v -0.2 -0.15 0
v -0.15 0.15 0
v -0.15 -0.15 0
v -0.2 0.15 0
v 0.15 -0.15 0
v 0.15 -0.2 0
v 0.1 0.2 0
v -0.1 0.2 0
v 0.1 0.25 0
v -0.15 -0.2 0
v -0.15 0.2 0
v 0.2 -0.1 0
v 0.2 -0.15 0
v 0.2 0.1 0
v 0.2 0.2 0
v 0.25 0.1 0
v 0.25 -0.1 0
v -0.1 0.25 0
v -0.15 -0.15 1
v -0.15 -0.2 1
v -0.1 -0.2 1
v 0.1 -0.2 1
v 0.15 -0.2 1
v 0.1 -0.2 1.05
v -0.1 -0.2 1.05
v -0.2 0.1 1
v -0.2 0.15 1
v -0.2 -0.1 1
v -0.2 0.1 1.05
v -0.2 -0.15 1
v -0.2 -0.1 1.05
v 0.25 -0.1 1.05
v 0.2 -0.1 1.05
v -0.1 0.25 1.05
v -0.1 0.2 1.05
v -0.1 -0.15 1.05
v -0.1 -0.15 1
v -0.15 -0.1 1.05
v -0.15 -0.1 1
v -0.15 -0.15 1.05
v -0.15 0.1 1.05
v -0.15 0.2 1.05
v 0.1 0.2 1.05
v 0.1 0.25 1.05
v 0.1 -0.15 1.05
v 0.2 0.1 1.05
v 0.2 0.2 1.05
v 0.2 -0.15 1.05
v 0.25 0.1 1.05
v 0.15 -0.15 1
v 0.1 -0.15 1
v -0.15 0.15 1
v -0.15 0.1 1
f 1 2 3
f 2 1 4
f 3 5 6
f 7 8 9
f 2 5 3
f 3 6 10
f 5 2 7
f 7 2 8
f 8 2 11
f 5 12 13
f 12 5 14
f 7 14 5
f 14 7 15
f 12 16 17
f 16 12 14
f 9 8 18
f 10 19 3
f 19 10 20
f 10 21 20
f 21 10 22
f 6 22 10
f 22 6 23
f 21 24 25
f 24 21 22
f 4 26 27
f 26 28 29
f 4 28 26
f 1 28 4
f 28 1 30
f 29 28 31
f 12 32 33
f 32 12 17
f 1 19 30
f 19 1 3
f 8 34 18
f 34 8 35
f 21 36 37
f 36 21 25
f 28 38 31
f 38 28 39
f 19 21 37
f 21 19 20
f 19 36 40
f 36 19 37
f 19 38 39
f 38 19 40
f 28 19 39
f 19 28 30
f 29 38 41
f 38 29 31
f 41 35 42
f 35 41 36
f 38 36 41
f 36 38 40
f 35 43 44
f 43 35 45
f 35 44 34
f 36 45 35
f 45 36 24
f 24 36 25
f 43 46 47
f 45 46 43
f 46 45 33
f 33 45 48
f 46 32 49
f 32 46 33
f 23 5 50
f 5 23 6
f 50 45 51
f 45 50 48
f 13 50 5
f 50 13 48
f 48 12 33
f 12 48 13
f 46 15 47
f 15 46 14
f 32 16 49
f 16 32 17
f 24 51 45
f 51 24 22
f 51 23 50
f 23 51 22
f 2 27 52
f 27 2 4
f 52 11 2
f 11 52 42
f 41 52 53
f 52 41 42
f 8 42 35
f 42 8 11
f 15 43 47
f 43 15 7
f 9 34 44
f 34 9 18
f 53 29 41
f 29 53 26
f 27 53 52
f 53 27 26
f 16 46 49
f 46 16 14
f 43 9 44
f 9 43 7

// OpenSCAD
translate([-0.125,-0.175,0.025]) cube(0.05, center = true);
translate([-0.175,-0.125,0.025]) cube(0.05, center = true);
translate([-0.125,-0.125,0.025]) cube(0.05, center = true);
translate([-0.125,-0.175,0.075]) cube(0.05, center = true);
translate([-0.175,-0.125,0.075]) cube(0.05, center = true);
translate([-0.125,-0.125,0.075]) cube(0.05, center = true);
translate([-0.05,-0.15,0.05]) cube(0.1, center = true);
translate([-0.15,-0.05,0.05]) cube(0.1, center = true);
translate([-0.05,-0.05,0.05]) cube(0.1, center = true);
translate([-0.125,-0.175,0.125]) cube(0.05, center = true);
translate([-0.175,-0.125,0.125]) cube(0.05, center = true);
translate([-0.125,-0.125,0.125]) cube(0.05, center = true);
translate([-0.125,-0.175,0.175]) cube(0.05, center = true);
translate([-0.175,-0.125,0.175]) cube(0.05, center = true);
translate([-0.125,-0.125,0.175]) cube(0.05, center = true);
translate([-0.05,-0.15,0.15]) cube(0.1, center = true);
translate([-0.15,-0.05,0.15]) cube(0.1, center = true);
translate([-0.05,-0.05,0.15]) cube(0.1, center = true);
translate([-0.125,-0.175,0.225]) cube(0.05, center = true);
translate([-0.175,-0.125,0.225]) cube(0.05, center = true);
translate([-0.125,-0.125,0.225]) cube(0.05, center = true);
translate([-0.125,-0.175,0.275]) cube(0.05, center = true);
translate([-0.175,-0.125,0.275]) cube(0.05, center = true);
translate([-0.125,-0.125,0.275]) cube(0.05, center = true);
translate([-0.05,-0.15,0.25]) cube(0.1, center = true);
translate([-0.15,-0.05,0.25]) cube(0.1, center = true);
translate([-0.05,-0.05,0.25]) cube(0.1, center = true);
translate([-0.125,-0.175,0.325]) cube(0.05, center = true);
translate([-0.175,-0.125,0.325]) cube(0.05, center = true);
translate([-0.125,-0.125,0.325]) cube(0.05, center = true);
translate([-0.125,-0.175,0.375]) cube(0.05, center = true);
translate([-0.175,-0.125,0.375]) cube(0.05, center = true);
translate([-0.125,-0.125,0.375]) cube(0.05, center = true);
translate([-0.05,-0.15,0.35]) cube(0.1, center = true);
translate([-0.15,-0.05,0.35]) cube(0.1, center = true);
translate([-0.05,-0.05,0.35]) cube(0.1, center = true);
translate([-0.125,-0.175,0.425]) cube(0.05, center = true);
translate([-0.175,-0.125,0.425]) cube(0.05, center = true);
translate([-0.125,-0.125,0.425]) cube(0.05, center = true);
translate([-0.125,-0.175,0.475]) cube(0.05, center = true);
translate([-0.175,-0.125,0.475]) cube(0.05, center = true);
translate([-0.125,-0.125,0.475]) cube(0.05, center = true);
translate([-0.05,-0.15,0.45]) cube(0.1, center = true);
translate([-0.15,-0.05,0.45]) cube(0.1, center = true);
translate([-0.05,-0.05,0.45]) cube(0.1, center = true);
translate([-0.125,-0.175,0.525]) cube(0.05, center = true);
translate([-0.175,-0.125,0.525]) cube(0.05, center = true);
translate([-0.125,-0.125,0.525]) cube(0.05, center = true);
translate([-0.125,-0.175,0.575]) cube(0.05, center = true);
translate([-0.175,-0.125,0.575]) cube(0.05, center = true);
translate([-0.125,-0.125,0.575]) cube(0.05, center = true);
translate([-0.05,-0.15,0.55]) cube(0.1, center = true);
translate([-0.15,-0.05,0.55]) cube(0.1, center = true);
translate([-0.05,-0.05,0.55]) cube(0.1, center = true);
translate([-0.125,-0.175,0.625]) cube(0.05, center = true);
translate([-0.175,-0.125,0.625]) cube(0.05, center = true);
translate([-0.125,-0.125,0.625]) cube(0.05, center = true);
translate([-0.125,-0.175,0.675]) cube(0.05, center = true);
translate([-0.175,-0.125,0.675]) cube(0.05, center = true);
translate([-0.125,-0.125,0.675]) cube(0.05, center = true);
translate([-0.05,-0.15,0.65]) cube(0.1, center = true);
translate([-0.15,-0.05,0.65]) cube(0.1, center = true);
translate([-0.05,-0.05,0.65]) cube(0.1, center = true);
translate([-0.125,-0.175,0.725]) cube(0.05, center = true);
translate([-0.175,-0.125,0.725]) cube(0.05, center = true);
translate([-0.125,-0.125,0.725]) cube(0.05, center = true);
translate([-0.125,-0.175,0.775]) cube(0.05, center = true);
translate([-0.175,-0.125,0.775]) cube(0.05, center = true);
translate([-0.125,-0.125,0.775]) cube(0.05, center = true);
translate([-0.05,-0.15,0.75]) cube(0.1, center = true);
translate([-0.15,-0.05,0.75]) cube(0.1, center = true);
translate([-0.05,-0.05,0.75]) cube(0.1, center = true);
translate([-0.125,-0.175,0.825]) cube(0.05, center = true);
translate([-0.175,-0.125,0.825]) cube(0.05, center = true);
translate([-0.125,-0.125,0.825]) cube(0.05, center = true);
translate([-0.125,-0.175,0.875]) cube(0.05, center = true);
translate([-0.175,-0.125,0.875]) cube(0.05, center = true);
translate([-0.125,-0.125,0.875]) cube(0.05, center = true);
translate([-0.05,-0.15,0.85]) cube(0.1, center = true);
translate([-0.15,-0.05,0.85]) cube(0.1, center = true);
translate([-0.05,-0.05,0.85]) cube(0.1, center = true);
translate([-0.125,-0.175,0.925]) cube(0.05, center = true);
translate([-0.175,-0.125,0.925]) cube(0.05, center = true);
translate([-0.125,-0.125,0.925]) cube(0.05, center = true);
translate([-0.125,-0.175,0.975]) cube(0.05, center = true);
translate([-0.175,-0.125,0.975]) cube(0.05, center = true);
translate([-0.125,-0.125,0.975]) cube(0.05, center = true);
translate([-0.05,-0.15,0.95]) cube(0.1, center = true);
translate([-0.15,-0.05,0.95]) cube(0.1, center = true);
translate([-0.05,-0.05,0.95]) cube(0.1, center = true);
translate([-0.125,-0.125,1.025]) cube(0.05, center = true);
translate([-0.075,-0.175,1.025]) cube(0.05, center = true);
translate([-0.025,-0.175,1.025]) cube(0.05, center = true);
translate([-0.075,-0.125,1.025]) cube(0.05, center = true);
translate([-0.025,-0.125,1.025]) cube(0.05, center = true);
translate([-0.175,-0.075,1.025]) cube(0.05, center = true);
translate([-0.125,-0.075,1.025]) cube(0.05, center = true);
translate([-0.175,-0.025,1.025]) cube(0.05, center = true);
translate([-0.125,-0.025,1.025]) cube(0.05, center = true);
translate([-0.075,-0.075,1.025]) cube(0.05, center = true);
translate([-0.025,-0.075,1.025]) cube(0.05, center = true);
translate([-0.075,-0.025,1.025]) cube(0.05, center = true);
translate([-0.025,-0.025,1.025]) cube(0.05, center = true);
translate([0.05,-0.15,0.05]) cube(0.1, center = true);
translate([0.125,-0.175,0.025]) cube(0.05, center = true);
translate([0.125,-0.125,0.025]) cube(0.05, center = true);
translate([0.175,-0.125,0.025]) cube(0.05, center = true);
translate([0.125,-0.175,0.075]) cube(0.05, center = true);
translate([0.125,-0.125,0.075]) cube(0.05, center = true);
translate([0.175,-0.125,0.075]) cube(0.05, center = true);
translate([0.05,-0.05,0.05]) cube(0.1, center = true);
translate([0.15,-0.05,0.05]) cube(0.1, center = true);
translate([0.05,-0.15,0.15]) cube(0.1, center = true);
translate([0.125,-0.175,0.125]) cube(0.05, center = true);
translate([0.125,-0.125,0.125]) cube(0.05, center = true);
translate([0.175,-0.125,0.125]) cube(0.05, center = true);
translate([0.125,-0.175,0.175]) cube(0.05, center = true);
translate([0.125,-0.125,0.175]) cube(0.05, center = true);
translate([0.175,-0.125,0.175]) cube(0.05, center = true);
translate([0.05,-0.05,0.15]) cube(0.1, center = true);
translate([0.15,-0.05,0.15]) cube(0.1, center = true);
translate([0.225,-0.075,0.025]) cube(0.05, center = true);
translate([0.225,-0.025,0.025]) cube(0.05, center = true);
translate([0.225,-0.075,0.075]) cube(0.05, center = true);
translate([0.225,-0.025,0.075]) cube(0.05, center = true);
translate([0.225,-0.075,0.125]) cube(0.05, center = true);
translate([0.225,-0.025,0.125]) cube(0.05, center = true);
translate([0.225,-0.075,0.175]) cube(0.05, center = true);
translate([0.225,-0.025,0.175]) cube(0.05, center = true);
translate([0.05,-0.15,0.25]) cube(0.1, center = true);
translate([0.125,-0.175,0.225]) cube(0.05, center = true);
translate([0.125,-0.125,0.225]) cube(0.05, center = true);
translate([0.175,-0.125,0.225]) cube(0.05, center = true);
translate([0.125,-0.175,0.275]) cube(0.05, center = true);
translate([0.125,-0.125,0.275]) cube(0.05, center = true);
translate([0.175,-0.125,0.275]) cube(0.05, center = true);
translate([0.05,-0.05,0.25]) cube(0.1, center = true);
translate([0.15,-0.05,0.25]) cube(0.1, center = true);
translate([0.05,-0.15,0.35]) cube(0.1, center = true);
translate([0.125,-0.175,0.325]) cube(0.05, center = true);
translate([0.125,-0.125,0.325]) cube(0.05, center = true);
translate([0.175,-0.125,0.325]) cube(0.05, center = true);
translate([0.125,-0.175,0.375]) cube(0.05, center = true);
translate([0.125,-0.125,0.375]) cube(0.05, center = true);
translate([0.175,-0.125,0.375]) cube(0.05, center = true);
translate([0.05,-0.05,0.35]) cube(0.1, center = true);
translate([0.15,-0.05,0.35]) cube(0.1, center = true);
translate([0.225,-0.075,0.225]) cube(0.05, center = true);
translate([0.225,-0.025,0.225]) cube(0.05, center = true);
translate([0.225,-0.075,0.275]) cube(0.05, center = true);
translate([0.225,-0.025,0.275]) cube(0.05, center = true);
translate([0.225,-0.075,0.325]) cube(0.05, center = true);
translate([0.225,-0.025,0.325]) cube(0.05, center = true);
translate([0.225,-0.075,0.375]) cube(0.05, center = true);
translate([0.225,-0.025,0.375]) cube(0.05, center = true);
translate([0.05,-0.15,0.45]) cube(0.1, center = true);
translate([0.125,-0.175,0.425]) cube(0.05, center = true);
translate([0.125,-0.125,0.425]) cube(0.05, center = true);
translate([0.175,-0.125,0.425]) cube(0.05, center = true);
translate([0.125,-0.175,0.475]) cube(0.05, center = true);
translate([0.125,-0.125,0.475]) cube(0.05, center = true);
translate([0.175,-0.125,0.475]) cube(0.05, center = true);
translate([0.05,-0.05,0.45]) cube(0.1, center = true);
translate([0.15,-0.05,0.45]) cube(0.1, center = true);
translate([0.05,-0.15,0.55]) cube(0.1, center = true);
translate([0.125,-0.175,0.525]) cube(0.05, center = true);
translate([0.125,-0.125,0.525]) cube(0.05, center = true);
translate([0.175,-0.125,0.525]) cube(0.05, center = true);
translate([0.125,-0.175,0.575]) cube(0.05, center = true);
translate([0.125,-0.125,0.575]) cube(0.05, center = true);
translate([0.175,-0.125,0.575]) cube(0.05, center = true);
translate([0.05,-0.05,0.55]) cube(0.1, center = true);
translate([0.15,-0.05,0.55]) cube(0.1, center = true);
translate([0.225,-0.075,0.425]) cube(0.05, center = true);
translate([0.225,-0.025,0.425]) cube(0.05, center = true);
translate([0.225,-0.075,0.475]) cube(0.05, center = true);
translate([0.225,-0.025,0.475]) cube(0.05, center = true);
translate([0.225,-0.075,0.525]) cube(0.05, center = true);
translate([0.225,-0.025,0.525]) cube(0.05, center = true);
translate([0.225,-0.075,0.575]) cube(0.05, center = true);
translate([0.225,-0.025,0.575]) cube(0.05, center = true);
translate([0.05,-0.15,0.65]) cube(0.1, center = true);
translate([0.125,-0.175,0.625]) cube(0.05, center = true);
translate([0.125,-0.125,0.625]) cube(0.05, center = true);
translate([0.175,-0.125,0.625]) cube(0.05, center = true);
translate([0.125,-0.175,0.675]) cube(0.05, center = true);
translate([0.125,-0.125,0.675]) cube(0.05, center = true);
translate([0.175,-0.125,0.675]) cube(0.05, center = true);
translate([0.05,-0.05,0.65]) cube(0.1, center = true);
translate([0.15,-0.05,0.65]) cube(0.1, center = true);
translate([0.05,-0.15,0.75]) cube(0.1, center = true);
translate([0.125,-0.175,0.725]) cube(0.05, center = true);
translate([0.125,-0.125,0.725]) cube(0.05, center = true);
translate([0.175,-0.125,0.725]) cube(0.05, center = true);
translate([0.125,-0.175,0.775]) cube(0.05, center = true);
translate([0.125,-0.125,0.775]) cube(0.05, center = true);
translate([0.175,-0.125,0.775]) cube(0.05, center = true);
translate([0.05,-0.05,0.75]) cube(0.1, center = true);
translate([0.15,-0.05,0.75]) cube(0.1, center = true);
translate([0.225,-0.075,0.625]) cube(0.05, center = true);
translate([0.225,-0.025,0.625]) cube(0.05, center = true);
translate([0.225,-0.075,0.675]) cube(0.05, center = true);
translate([0.225,-0.025,0.675]) cube(0.05, center = true);
translate([0.225,-0.075,0.725]) cube(0.05, center = true);
translate([0.225,-0.025,0.725]) cube(0.05, center = true);
translate([0.225,-0.075,0.775]) cube(0.05, center = true);
translate([0.225,-0.025,0.775]) cube(0.05, center = true);
translate([0.05,-0.15,0.85]) cube(0.1, center = true);
translate([0.125,-0.175,0.825]) cube(0.05, center = true);
translate([0.125,-0.125,0.825]) cube(0.05, center = true);
translate([0.175,-0.125,0.825]) cube(0.05, center = true);
translate([0.125,-0.175,0.875]) cube(0.05, center = true);
translate([0.125,-0.125,0.875]) cube(0.05, center = true);
translate([0.175,-0.125,0.875]) cube(0.05, center = true);
translate([0.05,-0.05,0.85]) cube(0.1, center = true);
translate([0.15,-0.05,0.85]) cube(0.1, center = true);
translate([0.05,-0.15,0.95]) cube(0.1, center = true);
translate([0.125,-0.175,0.925]) cube(0.05, center = true);
translate([0.125,-0.125,0.925]) cube(0.05, center = true);
translate([0.175,-0.125,0.925]) cube(0.05, center = true);
translate([0.125,-0.175,0.975]) cube(0.05, center = true);
translate([0.125,-0.125,0.975]) cube(0.05, center = true);
translate([0.175,-0.125,0.975]) cube(0.05, center = true);
translate([0.05,-0.05,0.95]) cube(0.1, center = true);
translate([0.15,-0.05,0.95]) cube(0.1, center = true);
translate([0.225,-0.075,0.825]) cube(0.05, center = true);
translate([0.225,-0.025,0.825]) cube(0.05, center = true);
translate([0.225,-0.075,0.875]) cube(0.05, center = true);
translate([0.225,-0.025,0.875]) cube(0.05, center = true);
translate([0.225,-0.075,0.925]) cube(0.05, center = true);
translate([0.225,-0.025,0.925]) cube(0.05, center = true);
translate([0.225,-0.075,0.975]) cube(0.05, center = true);
translate([0.225,-0.025,0.975]) cube(0.05, center = true);
translate([0.025,-0.175,1.025]) cube(0.05, center = true);
translate([0.075,-0.175,1.025]) cube(0.05, center = true);
translate([0.025,-0.125,1.025]) cube(0.05, center = true);
translate([0.075,-0.125,1.025]) cube(0.05, center = true);
translate([0.125,-0.125,1.025]) cube(0.05, center = true);
translate([0.175,-0.125,1.025]) cube(0.05, center = true);
translate([0.025,-0.075,1.025]) cube(0.05, center = true);
translate([0.075,-0.075,1.025]) cube(0.05, center = true);
translate([0.025,-0.025,1.025]) cube(0.05, center = true);
translate([0.075,-0.025,1.025]) cube(0.05, center = true);
translate([0.125,-0.075,1.025]) cube(0.05, center = true);
translate([0.175,-0.075,1.025]) cube(0.05, center = true);
translate([0.125,-0.025,1.025]) cube(0.05, center = true);
translate([0.175,-0.025,1.025]) cube(0.05, center = true);
translate([0.225,-0.075,1.025]) cube(0.05, center = true);
translate([0.225,-0.025,1.025]) cube(0.05, center = true);
translate([-0.15,0.05,0.05]) cube(0.1, center = true);
translate([-0.05,0.05,0.05]) cube(0.1, center = true);
translate([-0.175,0.125,0.025]) cube(0.05, center = true);
translate([-0.125,0.125,0.025]) cube(0.05, center = true);
translate([-0.125,0.175,0.025]) cube(0.05, center = true);
translate([-0.175,0.125,0.075]) cube(0.05, center = true);
translate([-0.125,0.125,0.075]) cube(0.05, center = true);
translate([-0.125,0.175,0.075]) cube(0.05, center = true);
translate([-0.05,0.15,0.05]) cube(0.1, center = true);
translate([-0.15,0.05,0.15]) cube(0.1, center = true);
translate([-0.05,0.05,0.15]) cube(0.1, center = true);
translate([-0.175,0.125,0.125]) cube(0.05, center = true);
translate([-0.125,0.125,0.125]) cube(0.05, center = true);
translate([-0.125,0.175,0.125]) cube(0.05, center = true);
translate([-0.175,0.125,0.175]) cube(0.05, center = true);
translate([-0.125,0.125,0.175]) cube(0.05, center = true);
translate([-0.125,0.175,0.175]) cube(0.05, center = true);
translate([-0.05,0.15,0.15]) cube(0.1, center = true);
translate([-0.075,0.225,0.025]) cube(0.05, center = true);
translate([-0.025,0.225,0.025]) cube(0.05, center = true);
translate([-0.075,0.225,0.075]) cube(0.05, center = true);
translate([-0.025,0.225,0.075]) cube(0.05, center = true);
translate([-0.075,0.225,0.125]) cube(0.05, center = true);
translate([-0.025,0.225,0.125]) cube(0.05, center = true);
translate([-0.075,0.225,0.175]) cube(0.05, center = true);
translate([-0.025,0.225,0.175]) cube(0.05, center = true);
translate([-0.15,0.05,0.25]) cube(0.1, center = true);
translate([-0.05,0.05,0.25]) cube(0.1, center = true);
translate([-0.175,0.125,0.225]) cube(0.05, center = true);
translate([-0.125,0.125,0.225]) cube(0.05, center = true);
translate([-0.125,0.175,0.225]) cube(0.05, center = true);
translate([-0.175,0.125,0.275]) cube(0.05, center = true);
translate([-0.125,0.125,0.275]) cube(0.05, center = true);
translate([-0.125,0.175,0.275]) cube(0.05, center = true);
translate([-0.05,0.15,0.25]) cube(0.1, center = true);
translate([-0.15,0.05,0.35]) cube(0.1, center = true);
translate([-0.05,0.05,0.35]) cube(0.1, center = true);
translate([-0.175,0.125,0.325]) cube(0.05, center = true);
translate([-0.125,0.125,0.325]) cube(0.05, center = true);
translate([-0.125,0.175,0.325]) cube(0.05, center = true);
translate([-0.175,0.125,0.375]) cube(0.05, center = true);
translate([-0.125,0.125,0.375]) cube(0.05, center = true);
translate([-0.125,0.175,0.375]) cube(0.05, center = true);
translate([-0.05,0.15,0.35]) cube(0.1, center = true);
translate([-0.075,0.225,0.225]) cube(0.05, center = true);
translate([-0.025,0.225,0.225]) cube(0.05, center = true);
translate([-0.075,0.225,0.275]) cube(0.05, center = true);
translate([-0.025,0.225,0.275]) cube(0.05, center = true);
translate([-0.075,0.225,0.325]) cube(0.05, center = true);
translate([-0.025,0.225,0.325]) cube(0.05, center = true);
translate([-0.075,0.225,0.375]) cube(0.05, center = true);
translate([-0.025,0.225,0.375]) cube(0.05, center = true);
translate([-0.15,0.05,0.45]) cube(0.1, center = true);
translate([-0.05,0.05,0.45]) cube(0.1, center = true);
translate([-0.175,0.125,0.425]) cube(0.05, center = true);
translate([-0.125,0.125,0.425]) cube(0.05, center = true);
translate([-0.125,0.175,0.425]) cube(0.05, center = true);
translate([-0.175,0.125,0.475]) cube(0.05, center = true);
translate([-0.125,0.125,0.475]) cube(0.05, center = true);
translate([-0.125,0.175,0.475]) cube(0.05, center = true);
translate([-0.05,0.15,0.45]) cube(0.1, center = true);
translate([-0.15,0.05,0.55]) cube(0.1, center = true);
translate([-0.05,0.05,0.55]) cube(0.1, center = true);
translate([-0.175,0.125,0.525]) cube(0.05, center = true);
translate([-0.125,0.125,0.525]) cube(0.05, center = true);
translate([-0.125,0.175,0.525]) cube(0.05, center = true);
translate([-0.175,0.125,0.575]) cube(0.05, center = true);
translate([-0.125,0.125,0.575]) cube(0.05, center = true);
translate([-0.125,0.175,0.575]) cube(0.05, center = true);
translate([-0.05,0.15,0.55]) cube(0.1, center = true);
translate([-0.075,0.225,0.425]) cube(0.05, center = true);
translate([-0.025,0.225,0.425]) cube(0.05, center = true);
translate([-0.075,0.225,0.475]) cube(0.05, center = true);
translate([-0.025,0.225,0.475]) cube(0.05, center = true);
translate([-0.075,0.225,0.525]) cube(0.05, center = true);
translate([-0.025,0.225,0.525]) cube(0.05, center = true);
translate([-0.075,0.225,0.575]) cube(0.05, center = true);
translate([-0.025,0.225,0.575]) cube(0.05, center = true);
translate([-0.15,0.05,0.65]) cube(0.1, center = true);
translate([-0.05,0.05,0.65]) cube(0.1, center = true);
translate([-0.175,0.125,0.625]) cube(0.05, center = true);
translate([-0.125,0.125,0.625]) cube(0.05, center = true);
translate([-0.125,0.175,0.625]) cube(0.05, center = true);
translate([-0.175,0.125,0.675]) cube(0.05, center = true);
translate([-0.125,0.125,0.675]) cube(0.05, center = true);
translate([-0.125,0.175,0.675]) cube(0.05, center = true);
translate([-0.05,0.15,0.65]) cube(0.1, center = true);
translate([-0.15,0.05,0.75]) cube(0.1, center = true);
translate([-0.05,0.05,0.75]) cube(0.1, center = true);
translate([-0.175,0.125,0.725]) cube(0.05, center = true);
translate([-0.125,0.125,0.725]) cube(0.05, center = true);
translate([-0.125,0.175,0.725]) cube(0.05, center = true);
translate([-0.175,0.125,0.775]) cube(0.05, center = true);
translate([-0.125,0.125,0.775]) cube(0.05, center = true);
translate([-0.125,0.175,0.775]) cube(0.05, center = true);
translate([-0.05,0.15,0.75]) cube(0.1, center = true);
translate([-0.075,0.225,0.625]) cube(0.05, center = true);
translate([-0.025,0.225,0.625]) cube(0.05, center = true);
translate([-0.075,0.225,0.675]) cube(0.05, center = true);
translate([-0.025,0.225,0.675]) cube(0.05, center = true);
translate([-0.075,0.225,0.725]) cube(0.05, center = true);
translate([-0.025,0.225,0.725]) cube(0.05, center = true);
translate([-0.075,0.225,0.775]) cube(0.05, center = true);
translate([-0.025,0.225,0.775]) cube(0.05, center = true);
translate([-0.15,0.05,0.85]) cube(0.1, center = true);
translate([-0.05,0.05,0.85]) cube(0.1, center = true);
translate([-0.175,0.125,0.825]) cube(0.05, center = true);
translate([-0.125,0.125,0.825]) cube(0.05, center = true);
translate([-0.125,0.175,0.825]) cube(0.05, center = true);
translate([-0.175,0.125,0.875]) cube(0.05, center = true);
translate([-0.125,0.125,0.875]) cube(0.05, center = true);
translate([-0.125,0.175,0.875]) cube(0.05, center = true);
translate([-0.05,0.15,0.85]) cube(0.1, center = true);
translate([-0.15,0.05,0.95]) cube(0.1, center = true);
translate([-0.05,0.05,0.95]) cube(0.1, center = true);
translate([-0.175,0.125,0.925]) cube(0.05, center = true);
translate([-0.125,0.125,0.925]) cube(0.05, center = true);
translate([-0.125,0.175,0.925]) cube(0.05, center = true);
translate([-0.175,0.125,0.975]) cube(0.05, center = true);
translate([-0.125,0.125,0.975]) cube(0.05, center = true);
translate([-0.125,0.175,0.975]) cube(0.05, center = true);
translate([-0.05,0.15,0.95]) cube(0.1, center = true);
translate([-0.075,0.225,0.825]) cube(0.05, center = true);
translate([-0.025,0.225,0.825]) cube(0.05, center = true);
translate([-0.075,0.225,0.875]) cube(0.05, center = true);
translate([-0.025,0.225,0.875]) cube(0.05, center = true);
translate([-0.075,0.225,0.925]) cube(0.05, center = true);
translate([-0.025,0.225,0.925]) cube(0.05, center = true);
translate([-0.075,0.225,0.975]) cube(0.05, center = true);
translate([-0.025,0.225,0.975]) cube(0.05, center = true);
translate([-0.175,0.025,1.025]) cube(0.05, center = true);
translate([-0.125,0.025,1.025]) cube(0.05, center = true);
translate([-0.175,0.075,1.025]) cube(0.05, center = true);
translate([-0.125,0.075,1.025]) cube(0.05, center = true);
translate([-0.075,0.025,1.025]) cube(0.05, center = true);
translate([-0.025,0.025,1.025]) cube(0.05, center = true);
translate([-0.075,0.075,1.025]) cube(0.05, center = true);
translate([-0.025,0.075,1.025]) cube(0.05, center = true);
translate([-0.125,0.125,1.025]) cube(0.05, center = true);
translate([-0.125,0.175,1.025]) cube(0.05, center = true);
translate([-0.075,0.125,1.025]) cube(0.05, center = true);
translate([-0.025,0.125,1.025]) cube(0.05, center = true);
translate([-0.075,0.175,1.025]) cube(0.05, center = true);
translate([-0.025,0.175,1.025]) cube(0.05, center = true);
translate([-0.075,0.225,1.025]) cube(0.05, center = true);
translate([-0.025,0.225,1.025]) cube(0.05, center = true);
translate([0.1,0.1,0.1]) cube(0.2, center = true);
translate([0.225,0.025,0.025]) cube(0.05, center = true);
translate([0.225,0.075,0.025]) cube(0.05, center = true);
translate([0.225,0.025,0.075]) cube(0.05, center = true);
translate([0.225,0.075,0.075]) cube(0.05, center = true);
translate([0.225,0.025,0.125]) cube(0.05, center = true);
translate([0.225,0.075,0.125]) cube(0.05, center = true);
translate([0.225,0.025,0.175]) cube(0.05, center = true);
translate([0.225,0.075,0.175]) cube(0.05, center = true);
translate([0.025,0.225,0.025]) cube(0.05, center = true);
translate([0.075,0.225,0.025]) cube(0.05, center = true);
translate([0.025,0.225,0.075]) cube(0.05, center = true);
translate([0.075,0.225,0.075]) cube(0.05, center = true);
translate([0.025,0.225,0.125]) cube(0.05, center = true);
translate([0.075,0.225,0.125]) cube(0.05, center = true);
translate([0.025,0.225,0.175]) cube(0.05, center = true);
translate([0.075,0.225,0.175]) cube(0.05, center = true);
translate([0.1,0.1,0.3]) cube(0.2, center = true);
translate([0.225,0.025,0.225]) cube(0.05, center = true);
translate([0.225,0.075,0.225]) cube(0.05, center = true);
translate([0.225,0.025,0.275]) cube(0.05, center = true);
translate([0.225,0.075,0.275]) cube(0.05, center = true);
translate([0.225,0.025,0.325]) cube(0.05, center = true);
translate([0.225,0.075,0.325]) cube(0.05, center = true);
translate([0.225,0.025,0.375]) cube(0.05, center = true);
translate([0.225,0.075,0.375]) cube(0.05, center = true);
translate([0.025,0.225,0.225]) cube(0.05, center = true);
translate([0.075,0.225,0.225]) cube(0.05, center = true);
translate([0.025,0.225,0.275]) cube(0.05, center = true);
translate([0.075,0.225,0.275]) cube(0.05, center = true);
translate([0.025,0.225,0.325]) cube(0.05, center = true);
translate([0.075,0.225,0.325]) cube(0.05, center = true);
translate([0.025,0.225,0.375]) cube(0.05, center = true);
translate([0.075,0.225,0.375]) cube(0.05, center = true);
translate([0.1,0.1,0.5]) cube(0.2, center = true);
translate([0.225,0.025,0.425]) cube(0.05, center = true);
translate([0.225,0.075,0.425]) cube(0.05, center = true);
translate([0.225,0.025,0.475]) cube(0.05, center = true);
translate([0.225,0.075,0.475]) cube(0.05, center = true);
translate([0.225,0.025,0.525]) cube(0.05, center = true);
translate([0.225,0.075,0.525]) cube(0.05, center = true);
translate([0.225,0.025,0.575]) cube(0.05, center = true);
translate([0.225,0.075,0.575]) cube(0.05, center = true);
translate([0.025,0.225,0.425]) cube(0.05, center = true);
translate([0.075,0.225,0.425]) cube(0.05, center = true);
translate([0.025,0.225,0.475]) cube(0.05, center = true);
translate([0.075,0.225,0.475]) cube(0.05, center = true);
translate([0.025,0.225,0.525]) cube(0.05, center = true);
translate([0.075,0.225,0.525]) cube(0.05, center = true);
translate([0.025,0.225,0.575]) cube(0.05, center = true);
translate([0.075,0.225,0.575]) cube(0.05, center = true);
translate([0.1,0.1,0.7]) cube(0.2, center = true);
translate([0.225,0.025,0.625]) cube(0.05, center = true);
translate([0.225,0.075,0.625]) cube(0.05, center = true);
translate([0.225,0.025,0.675]) cube(0.05, center = true);
translate([0.225,0.075,0.675]) cube(0.05, center = true);
translate([0.225,0.025,0.725]) cube(0.05, center = true);
translate([0.225,0.075,0.725]) cube(0.05, center = true);
translate([0.225,0.025,0.775]) cube(0.05, center = true);
translate([0.225,0.075,0.775]) cube(0.05, center = true);
translate([0.025,0.225,0.625]) cube(0.05, center = true);
translate([0.075,0.225,0.625]) cube(0.05, center = true);
translate([0.025,0.225,0.675]) cube(0.05, center = true);
translate([0.075,0.225,0.675]) cube(0.05, center = true);
translate([0.025,0.225,0.725]) cube(0.05, center = true);
translate([0.075,0.225,0.725]) cube(0.05, center = true);
translate([0.025,0.225,0.775]) cube(0.05, center = true);
translate([0.075,0.225,0.775]) cube(0.05, center = true);
translate([0.1,0.1,0.9]) cube(0.2, center = true);
translate([0.225,0.025,0.825]) cube(0.05, center = true);
translate([0.225,0.075,0.825]) cube(0.05, center = true);
translate([0.225,0.025,0.875]) cube(0.05, center = true);
translate([0.225,0.075,0.875]) cube(0.05, center = true);
translate([0.225,0.025,0.925]) cube(0.05, center = true);
translate([0.225,0.075,0.925]) cube(0.05, center = true);
translate([0.225,0.025,0.975]) cube(0.05, center = true);
translate([0.225,0.075,0.975]) cube(0.05, center = true);
translate([0.025,0.225,0.825]) cube(0.05, center = true);
translate([0.075,0.225,0.825]) cube(0.05, center = true);
translate([0.025,0.225,0.875]) cube(0.05, center = true);
translate([0.075,0.225,0.875]) cube(0.05, center = true);
translate([0.025,0.225,0.925]) cube(0.05, center = true);
translate([0.075,0.225,0.925]) cube(0.05, center = true);
translate([0.025,0.225,0.975]) cube(0.05, center = true);
translate([0.075,0.225,0.975]) cube(0.05, center = true);
translate([0.025,0.025,1.025]) cube(0.05, center = true);
translate([0.075,0.025,1.025]) cube(0.05, center = true);
translate([0.025,0.075,1.025]) cube(0.05, center = true);
translate([0.075,0.075,1.025]) cube(0.05, center = true);
translate([0.125,0.025,1.025]) cube(0.05, center = true);
translate([0.175,0.025,1.025]) cube(0.05, center = true);
translate([0.125,0.075,1.025]) cube(0.05, center = true);
translate([0.175,0.075,1.025]) cube(0.05, center = true);
translate([0.025,0.125,1.025]) cube(0.05, center = true);
translate([0.075,0.125,1.025]) cube(0.05, center = true);
translate([0.025,0.175,1.025]) cube(0.05, center = true);
translate([0.075,0.175,1.025]) cube(0.05, center = true);
translate([0.125,0.125,1.025]) cube(0.05, center = true);
translate([0.175,0.125,1.025]) cube(0.05, center = true);
translate([0.125,0.175,1.025]) cube(0.05, center = true);
translate([0.175,0.175,1.025]) cube(0.05, center = true);
translate([0.225,0.025,1.025]) cube(0.05, center = true);
translate([0.225,0.075,1.025]) cube(0.05, center = true);
translate([0.025,0.225,1.025]) cube(0.05, center = true);
translate([0.075,0.225,1.025]) cube(0.05, center = true);
